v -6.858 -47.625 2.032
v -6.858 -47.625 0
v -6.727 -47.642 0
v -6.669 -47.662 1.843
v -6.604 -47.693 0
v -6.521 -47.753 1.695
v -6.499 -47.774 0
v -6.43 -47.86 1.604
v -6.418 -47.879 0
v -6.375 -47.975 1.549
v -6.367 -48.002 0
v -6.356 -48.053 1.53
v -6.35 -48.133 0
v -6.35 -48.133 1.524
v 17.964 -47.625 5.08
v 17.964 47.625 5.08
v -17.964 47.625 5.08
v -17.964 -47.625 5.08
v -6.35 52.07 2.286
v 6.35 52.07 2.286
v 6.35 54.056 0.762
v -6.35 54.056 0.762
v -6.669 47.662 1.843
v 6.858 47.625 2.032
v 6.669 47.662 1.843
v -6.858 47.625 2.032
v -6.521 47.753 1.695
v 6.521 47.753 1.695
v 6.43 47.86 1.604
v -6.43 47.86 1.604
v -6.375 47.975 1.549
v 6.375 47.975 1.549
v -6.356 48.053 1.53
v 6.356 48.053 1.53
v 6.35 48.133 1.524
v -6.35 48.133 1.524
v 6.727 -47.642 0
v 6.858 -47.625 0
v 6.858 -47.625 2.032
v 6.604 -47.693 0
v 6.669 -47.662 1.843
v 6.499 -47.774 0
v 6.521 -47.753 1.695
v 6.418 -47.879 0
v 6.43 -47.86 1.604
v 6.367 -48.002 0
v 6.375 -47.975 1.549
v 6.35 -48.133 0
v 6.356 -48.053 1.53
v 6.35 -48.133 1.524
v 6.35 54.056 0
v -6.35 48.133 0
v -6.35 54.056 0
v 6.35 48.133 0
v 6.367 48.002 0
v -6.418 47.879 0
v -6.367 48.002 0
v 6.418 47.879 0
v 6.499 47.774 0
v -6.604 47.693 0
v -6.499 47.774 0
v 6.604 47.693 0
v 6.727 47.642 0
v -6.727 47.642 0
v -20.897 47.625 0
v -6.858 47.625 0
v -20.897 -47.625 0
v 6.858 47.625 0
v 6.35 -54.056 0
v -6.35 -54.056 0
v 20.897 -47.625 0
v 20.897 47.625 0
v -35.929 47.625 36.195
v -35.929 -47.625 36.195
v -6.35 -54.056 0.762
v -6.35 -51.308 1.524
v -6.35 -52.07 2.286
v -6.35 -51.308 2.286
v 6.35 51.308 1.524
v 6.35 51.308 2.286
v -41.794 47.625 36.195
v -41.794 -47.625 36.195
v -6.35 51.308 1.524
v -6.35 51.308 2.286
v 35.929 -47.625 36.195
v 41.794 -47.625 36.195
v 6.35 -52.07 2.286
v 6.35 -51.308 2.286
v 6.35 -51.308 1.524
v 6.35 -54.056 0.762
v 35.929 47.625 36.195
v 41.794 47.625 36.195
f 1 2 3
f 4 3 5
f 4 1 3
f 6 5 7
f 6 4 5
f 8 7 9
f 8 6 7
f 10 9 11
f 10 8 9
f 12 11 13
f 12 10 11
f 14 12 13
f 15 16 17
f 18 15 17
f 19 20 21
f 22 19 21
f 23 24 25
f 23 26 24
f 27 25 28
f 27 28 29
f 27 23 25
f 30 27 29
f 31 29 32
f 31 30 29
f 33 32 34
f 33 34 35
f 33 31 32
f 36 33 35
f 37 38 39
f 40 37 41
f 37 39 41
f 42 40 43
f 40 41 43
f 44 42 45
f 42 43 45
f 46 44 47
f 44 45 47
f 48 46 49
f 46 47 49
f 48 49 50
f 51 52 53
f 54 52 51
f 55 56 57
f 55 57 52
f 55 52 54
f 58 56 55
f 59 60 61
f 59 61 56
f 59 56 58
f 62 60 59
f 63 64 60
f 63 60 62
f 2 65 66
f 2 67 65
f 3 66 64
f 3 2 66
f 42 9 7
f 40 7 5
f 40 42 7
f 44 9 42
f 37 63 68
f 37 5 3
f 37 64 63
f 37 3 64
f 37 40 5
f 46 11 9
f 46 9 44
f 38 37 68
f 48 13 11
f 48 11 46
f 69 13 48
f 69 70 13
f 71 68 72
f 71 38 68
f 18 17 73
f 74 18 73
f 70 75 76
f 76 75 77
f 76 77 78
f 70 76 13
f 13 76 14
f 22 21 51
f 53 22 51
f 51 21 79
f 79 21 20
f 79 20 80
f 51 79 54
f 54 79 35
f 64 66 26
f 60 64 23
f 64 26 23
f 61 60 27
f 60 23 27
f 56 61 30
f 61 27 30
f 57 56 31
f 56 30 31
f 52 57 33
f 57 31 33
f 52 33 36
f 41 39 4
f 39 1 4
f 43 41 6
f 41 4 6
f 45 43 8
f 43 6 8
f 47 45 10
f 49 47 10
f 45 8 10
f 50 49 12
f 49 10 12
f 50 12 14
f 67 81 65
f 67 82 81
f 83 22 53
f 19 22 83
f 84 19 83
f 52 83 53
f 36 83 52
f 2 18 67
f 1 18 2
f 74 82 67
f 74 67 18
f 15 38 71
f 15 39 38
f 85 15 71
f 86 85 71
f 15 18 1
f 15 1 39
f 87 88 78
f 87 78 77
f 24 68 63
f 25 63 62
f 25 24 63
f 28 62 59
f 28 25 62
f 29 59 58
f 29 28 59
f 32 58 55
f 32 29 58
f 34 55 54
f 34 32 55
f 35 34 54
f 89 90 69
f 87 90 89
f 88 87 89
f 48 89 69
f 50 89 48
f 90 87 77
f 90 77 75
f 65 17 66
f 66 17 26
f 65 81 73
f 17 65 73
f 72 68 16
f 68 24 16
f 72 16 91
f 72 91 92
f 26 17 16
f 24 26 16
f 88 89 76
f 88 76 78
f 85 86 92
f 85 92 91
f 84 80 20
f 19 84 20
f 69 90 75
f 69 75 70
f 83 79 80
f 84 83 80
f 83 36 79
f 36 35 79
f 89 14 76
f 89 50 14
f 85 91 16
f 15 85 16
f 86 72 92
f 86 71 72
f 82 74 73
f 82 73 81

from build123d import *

# Parameters (mm, degrees)
F1_DEPTH = 47.625
F3_DEPTH = 6.35
F4_R     = 0.508


# Not quite as in the source:
# - a pattern or mirror of a feature is missing from the dataset's text; its kind, count and spacing are read off the source's solid


with BuildPart() as f1:
    # F0 (on Front) → F1 (new body, symmetric)
    with BuildSketch(Plane.XZ):
        Polygon((20.8971929933, 0), (41.7943859866, 36.195), (35.9285072517, 36.195), (17.9642536258, 5.08), (-17.9642536258, 5.08), (-35.9285072517, 36.195), (-41.7943859866, 36.195), (-20.8971929933, 0), align=None)
    extrude(amount=F1_DEPTH, both=True)

    # F2 (on Right) → F3 (join, symmetric)
    with BuildSketch(Plane.YZ):
        Polygon((-47.625, 1.524), (-51.308, 1.524), (-51.308, 2.286), (-52.07, 2.286), (-54.0561154682, 0.762), (-54.0561154682, 0), (-47.625, 0), align=None)
    f3 = extrude(amount=F3_DEPTH, both=True)

    # F3_copies: F3 across plane
    add(f3.mirror(Plane.ZX))

    # F4
    f4_edges = [f1.edges().sort_by_distance(p)[0] for p in [
        (-6.35, -47.625, 0.762),
        (6.35, -47.625, 0.762),
        (0, -47.625, 1.524),
        (6.35, 47.625, 0.762),
        (0, 47.625, 1.524),
        (-6.35, 47.625, 0.762),
    ]]
    fillet(f4_edges, radius=F4_R)


solid = f1.part
